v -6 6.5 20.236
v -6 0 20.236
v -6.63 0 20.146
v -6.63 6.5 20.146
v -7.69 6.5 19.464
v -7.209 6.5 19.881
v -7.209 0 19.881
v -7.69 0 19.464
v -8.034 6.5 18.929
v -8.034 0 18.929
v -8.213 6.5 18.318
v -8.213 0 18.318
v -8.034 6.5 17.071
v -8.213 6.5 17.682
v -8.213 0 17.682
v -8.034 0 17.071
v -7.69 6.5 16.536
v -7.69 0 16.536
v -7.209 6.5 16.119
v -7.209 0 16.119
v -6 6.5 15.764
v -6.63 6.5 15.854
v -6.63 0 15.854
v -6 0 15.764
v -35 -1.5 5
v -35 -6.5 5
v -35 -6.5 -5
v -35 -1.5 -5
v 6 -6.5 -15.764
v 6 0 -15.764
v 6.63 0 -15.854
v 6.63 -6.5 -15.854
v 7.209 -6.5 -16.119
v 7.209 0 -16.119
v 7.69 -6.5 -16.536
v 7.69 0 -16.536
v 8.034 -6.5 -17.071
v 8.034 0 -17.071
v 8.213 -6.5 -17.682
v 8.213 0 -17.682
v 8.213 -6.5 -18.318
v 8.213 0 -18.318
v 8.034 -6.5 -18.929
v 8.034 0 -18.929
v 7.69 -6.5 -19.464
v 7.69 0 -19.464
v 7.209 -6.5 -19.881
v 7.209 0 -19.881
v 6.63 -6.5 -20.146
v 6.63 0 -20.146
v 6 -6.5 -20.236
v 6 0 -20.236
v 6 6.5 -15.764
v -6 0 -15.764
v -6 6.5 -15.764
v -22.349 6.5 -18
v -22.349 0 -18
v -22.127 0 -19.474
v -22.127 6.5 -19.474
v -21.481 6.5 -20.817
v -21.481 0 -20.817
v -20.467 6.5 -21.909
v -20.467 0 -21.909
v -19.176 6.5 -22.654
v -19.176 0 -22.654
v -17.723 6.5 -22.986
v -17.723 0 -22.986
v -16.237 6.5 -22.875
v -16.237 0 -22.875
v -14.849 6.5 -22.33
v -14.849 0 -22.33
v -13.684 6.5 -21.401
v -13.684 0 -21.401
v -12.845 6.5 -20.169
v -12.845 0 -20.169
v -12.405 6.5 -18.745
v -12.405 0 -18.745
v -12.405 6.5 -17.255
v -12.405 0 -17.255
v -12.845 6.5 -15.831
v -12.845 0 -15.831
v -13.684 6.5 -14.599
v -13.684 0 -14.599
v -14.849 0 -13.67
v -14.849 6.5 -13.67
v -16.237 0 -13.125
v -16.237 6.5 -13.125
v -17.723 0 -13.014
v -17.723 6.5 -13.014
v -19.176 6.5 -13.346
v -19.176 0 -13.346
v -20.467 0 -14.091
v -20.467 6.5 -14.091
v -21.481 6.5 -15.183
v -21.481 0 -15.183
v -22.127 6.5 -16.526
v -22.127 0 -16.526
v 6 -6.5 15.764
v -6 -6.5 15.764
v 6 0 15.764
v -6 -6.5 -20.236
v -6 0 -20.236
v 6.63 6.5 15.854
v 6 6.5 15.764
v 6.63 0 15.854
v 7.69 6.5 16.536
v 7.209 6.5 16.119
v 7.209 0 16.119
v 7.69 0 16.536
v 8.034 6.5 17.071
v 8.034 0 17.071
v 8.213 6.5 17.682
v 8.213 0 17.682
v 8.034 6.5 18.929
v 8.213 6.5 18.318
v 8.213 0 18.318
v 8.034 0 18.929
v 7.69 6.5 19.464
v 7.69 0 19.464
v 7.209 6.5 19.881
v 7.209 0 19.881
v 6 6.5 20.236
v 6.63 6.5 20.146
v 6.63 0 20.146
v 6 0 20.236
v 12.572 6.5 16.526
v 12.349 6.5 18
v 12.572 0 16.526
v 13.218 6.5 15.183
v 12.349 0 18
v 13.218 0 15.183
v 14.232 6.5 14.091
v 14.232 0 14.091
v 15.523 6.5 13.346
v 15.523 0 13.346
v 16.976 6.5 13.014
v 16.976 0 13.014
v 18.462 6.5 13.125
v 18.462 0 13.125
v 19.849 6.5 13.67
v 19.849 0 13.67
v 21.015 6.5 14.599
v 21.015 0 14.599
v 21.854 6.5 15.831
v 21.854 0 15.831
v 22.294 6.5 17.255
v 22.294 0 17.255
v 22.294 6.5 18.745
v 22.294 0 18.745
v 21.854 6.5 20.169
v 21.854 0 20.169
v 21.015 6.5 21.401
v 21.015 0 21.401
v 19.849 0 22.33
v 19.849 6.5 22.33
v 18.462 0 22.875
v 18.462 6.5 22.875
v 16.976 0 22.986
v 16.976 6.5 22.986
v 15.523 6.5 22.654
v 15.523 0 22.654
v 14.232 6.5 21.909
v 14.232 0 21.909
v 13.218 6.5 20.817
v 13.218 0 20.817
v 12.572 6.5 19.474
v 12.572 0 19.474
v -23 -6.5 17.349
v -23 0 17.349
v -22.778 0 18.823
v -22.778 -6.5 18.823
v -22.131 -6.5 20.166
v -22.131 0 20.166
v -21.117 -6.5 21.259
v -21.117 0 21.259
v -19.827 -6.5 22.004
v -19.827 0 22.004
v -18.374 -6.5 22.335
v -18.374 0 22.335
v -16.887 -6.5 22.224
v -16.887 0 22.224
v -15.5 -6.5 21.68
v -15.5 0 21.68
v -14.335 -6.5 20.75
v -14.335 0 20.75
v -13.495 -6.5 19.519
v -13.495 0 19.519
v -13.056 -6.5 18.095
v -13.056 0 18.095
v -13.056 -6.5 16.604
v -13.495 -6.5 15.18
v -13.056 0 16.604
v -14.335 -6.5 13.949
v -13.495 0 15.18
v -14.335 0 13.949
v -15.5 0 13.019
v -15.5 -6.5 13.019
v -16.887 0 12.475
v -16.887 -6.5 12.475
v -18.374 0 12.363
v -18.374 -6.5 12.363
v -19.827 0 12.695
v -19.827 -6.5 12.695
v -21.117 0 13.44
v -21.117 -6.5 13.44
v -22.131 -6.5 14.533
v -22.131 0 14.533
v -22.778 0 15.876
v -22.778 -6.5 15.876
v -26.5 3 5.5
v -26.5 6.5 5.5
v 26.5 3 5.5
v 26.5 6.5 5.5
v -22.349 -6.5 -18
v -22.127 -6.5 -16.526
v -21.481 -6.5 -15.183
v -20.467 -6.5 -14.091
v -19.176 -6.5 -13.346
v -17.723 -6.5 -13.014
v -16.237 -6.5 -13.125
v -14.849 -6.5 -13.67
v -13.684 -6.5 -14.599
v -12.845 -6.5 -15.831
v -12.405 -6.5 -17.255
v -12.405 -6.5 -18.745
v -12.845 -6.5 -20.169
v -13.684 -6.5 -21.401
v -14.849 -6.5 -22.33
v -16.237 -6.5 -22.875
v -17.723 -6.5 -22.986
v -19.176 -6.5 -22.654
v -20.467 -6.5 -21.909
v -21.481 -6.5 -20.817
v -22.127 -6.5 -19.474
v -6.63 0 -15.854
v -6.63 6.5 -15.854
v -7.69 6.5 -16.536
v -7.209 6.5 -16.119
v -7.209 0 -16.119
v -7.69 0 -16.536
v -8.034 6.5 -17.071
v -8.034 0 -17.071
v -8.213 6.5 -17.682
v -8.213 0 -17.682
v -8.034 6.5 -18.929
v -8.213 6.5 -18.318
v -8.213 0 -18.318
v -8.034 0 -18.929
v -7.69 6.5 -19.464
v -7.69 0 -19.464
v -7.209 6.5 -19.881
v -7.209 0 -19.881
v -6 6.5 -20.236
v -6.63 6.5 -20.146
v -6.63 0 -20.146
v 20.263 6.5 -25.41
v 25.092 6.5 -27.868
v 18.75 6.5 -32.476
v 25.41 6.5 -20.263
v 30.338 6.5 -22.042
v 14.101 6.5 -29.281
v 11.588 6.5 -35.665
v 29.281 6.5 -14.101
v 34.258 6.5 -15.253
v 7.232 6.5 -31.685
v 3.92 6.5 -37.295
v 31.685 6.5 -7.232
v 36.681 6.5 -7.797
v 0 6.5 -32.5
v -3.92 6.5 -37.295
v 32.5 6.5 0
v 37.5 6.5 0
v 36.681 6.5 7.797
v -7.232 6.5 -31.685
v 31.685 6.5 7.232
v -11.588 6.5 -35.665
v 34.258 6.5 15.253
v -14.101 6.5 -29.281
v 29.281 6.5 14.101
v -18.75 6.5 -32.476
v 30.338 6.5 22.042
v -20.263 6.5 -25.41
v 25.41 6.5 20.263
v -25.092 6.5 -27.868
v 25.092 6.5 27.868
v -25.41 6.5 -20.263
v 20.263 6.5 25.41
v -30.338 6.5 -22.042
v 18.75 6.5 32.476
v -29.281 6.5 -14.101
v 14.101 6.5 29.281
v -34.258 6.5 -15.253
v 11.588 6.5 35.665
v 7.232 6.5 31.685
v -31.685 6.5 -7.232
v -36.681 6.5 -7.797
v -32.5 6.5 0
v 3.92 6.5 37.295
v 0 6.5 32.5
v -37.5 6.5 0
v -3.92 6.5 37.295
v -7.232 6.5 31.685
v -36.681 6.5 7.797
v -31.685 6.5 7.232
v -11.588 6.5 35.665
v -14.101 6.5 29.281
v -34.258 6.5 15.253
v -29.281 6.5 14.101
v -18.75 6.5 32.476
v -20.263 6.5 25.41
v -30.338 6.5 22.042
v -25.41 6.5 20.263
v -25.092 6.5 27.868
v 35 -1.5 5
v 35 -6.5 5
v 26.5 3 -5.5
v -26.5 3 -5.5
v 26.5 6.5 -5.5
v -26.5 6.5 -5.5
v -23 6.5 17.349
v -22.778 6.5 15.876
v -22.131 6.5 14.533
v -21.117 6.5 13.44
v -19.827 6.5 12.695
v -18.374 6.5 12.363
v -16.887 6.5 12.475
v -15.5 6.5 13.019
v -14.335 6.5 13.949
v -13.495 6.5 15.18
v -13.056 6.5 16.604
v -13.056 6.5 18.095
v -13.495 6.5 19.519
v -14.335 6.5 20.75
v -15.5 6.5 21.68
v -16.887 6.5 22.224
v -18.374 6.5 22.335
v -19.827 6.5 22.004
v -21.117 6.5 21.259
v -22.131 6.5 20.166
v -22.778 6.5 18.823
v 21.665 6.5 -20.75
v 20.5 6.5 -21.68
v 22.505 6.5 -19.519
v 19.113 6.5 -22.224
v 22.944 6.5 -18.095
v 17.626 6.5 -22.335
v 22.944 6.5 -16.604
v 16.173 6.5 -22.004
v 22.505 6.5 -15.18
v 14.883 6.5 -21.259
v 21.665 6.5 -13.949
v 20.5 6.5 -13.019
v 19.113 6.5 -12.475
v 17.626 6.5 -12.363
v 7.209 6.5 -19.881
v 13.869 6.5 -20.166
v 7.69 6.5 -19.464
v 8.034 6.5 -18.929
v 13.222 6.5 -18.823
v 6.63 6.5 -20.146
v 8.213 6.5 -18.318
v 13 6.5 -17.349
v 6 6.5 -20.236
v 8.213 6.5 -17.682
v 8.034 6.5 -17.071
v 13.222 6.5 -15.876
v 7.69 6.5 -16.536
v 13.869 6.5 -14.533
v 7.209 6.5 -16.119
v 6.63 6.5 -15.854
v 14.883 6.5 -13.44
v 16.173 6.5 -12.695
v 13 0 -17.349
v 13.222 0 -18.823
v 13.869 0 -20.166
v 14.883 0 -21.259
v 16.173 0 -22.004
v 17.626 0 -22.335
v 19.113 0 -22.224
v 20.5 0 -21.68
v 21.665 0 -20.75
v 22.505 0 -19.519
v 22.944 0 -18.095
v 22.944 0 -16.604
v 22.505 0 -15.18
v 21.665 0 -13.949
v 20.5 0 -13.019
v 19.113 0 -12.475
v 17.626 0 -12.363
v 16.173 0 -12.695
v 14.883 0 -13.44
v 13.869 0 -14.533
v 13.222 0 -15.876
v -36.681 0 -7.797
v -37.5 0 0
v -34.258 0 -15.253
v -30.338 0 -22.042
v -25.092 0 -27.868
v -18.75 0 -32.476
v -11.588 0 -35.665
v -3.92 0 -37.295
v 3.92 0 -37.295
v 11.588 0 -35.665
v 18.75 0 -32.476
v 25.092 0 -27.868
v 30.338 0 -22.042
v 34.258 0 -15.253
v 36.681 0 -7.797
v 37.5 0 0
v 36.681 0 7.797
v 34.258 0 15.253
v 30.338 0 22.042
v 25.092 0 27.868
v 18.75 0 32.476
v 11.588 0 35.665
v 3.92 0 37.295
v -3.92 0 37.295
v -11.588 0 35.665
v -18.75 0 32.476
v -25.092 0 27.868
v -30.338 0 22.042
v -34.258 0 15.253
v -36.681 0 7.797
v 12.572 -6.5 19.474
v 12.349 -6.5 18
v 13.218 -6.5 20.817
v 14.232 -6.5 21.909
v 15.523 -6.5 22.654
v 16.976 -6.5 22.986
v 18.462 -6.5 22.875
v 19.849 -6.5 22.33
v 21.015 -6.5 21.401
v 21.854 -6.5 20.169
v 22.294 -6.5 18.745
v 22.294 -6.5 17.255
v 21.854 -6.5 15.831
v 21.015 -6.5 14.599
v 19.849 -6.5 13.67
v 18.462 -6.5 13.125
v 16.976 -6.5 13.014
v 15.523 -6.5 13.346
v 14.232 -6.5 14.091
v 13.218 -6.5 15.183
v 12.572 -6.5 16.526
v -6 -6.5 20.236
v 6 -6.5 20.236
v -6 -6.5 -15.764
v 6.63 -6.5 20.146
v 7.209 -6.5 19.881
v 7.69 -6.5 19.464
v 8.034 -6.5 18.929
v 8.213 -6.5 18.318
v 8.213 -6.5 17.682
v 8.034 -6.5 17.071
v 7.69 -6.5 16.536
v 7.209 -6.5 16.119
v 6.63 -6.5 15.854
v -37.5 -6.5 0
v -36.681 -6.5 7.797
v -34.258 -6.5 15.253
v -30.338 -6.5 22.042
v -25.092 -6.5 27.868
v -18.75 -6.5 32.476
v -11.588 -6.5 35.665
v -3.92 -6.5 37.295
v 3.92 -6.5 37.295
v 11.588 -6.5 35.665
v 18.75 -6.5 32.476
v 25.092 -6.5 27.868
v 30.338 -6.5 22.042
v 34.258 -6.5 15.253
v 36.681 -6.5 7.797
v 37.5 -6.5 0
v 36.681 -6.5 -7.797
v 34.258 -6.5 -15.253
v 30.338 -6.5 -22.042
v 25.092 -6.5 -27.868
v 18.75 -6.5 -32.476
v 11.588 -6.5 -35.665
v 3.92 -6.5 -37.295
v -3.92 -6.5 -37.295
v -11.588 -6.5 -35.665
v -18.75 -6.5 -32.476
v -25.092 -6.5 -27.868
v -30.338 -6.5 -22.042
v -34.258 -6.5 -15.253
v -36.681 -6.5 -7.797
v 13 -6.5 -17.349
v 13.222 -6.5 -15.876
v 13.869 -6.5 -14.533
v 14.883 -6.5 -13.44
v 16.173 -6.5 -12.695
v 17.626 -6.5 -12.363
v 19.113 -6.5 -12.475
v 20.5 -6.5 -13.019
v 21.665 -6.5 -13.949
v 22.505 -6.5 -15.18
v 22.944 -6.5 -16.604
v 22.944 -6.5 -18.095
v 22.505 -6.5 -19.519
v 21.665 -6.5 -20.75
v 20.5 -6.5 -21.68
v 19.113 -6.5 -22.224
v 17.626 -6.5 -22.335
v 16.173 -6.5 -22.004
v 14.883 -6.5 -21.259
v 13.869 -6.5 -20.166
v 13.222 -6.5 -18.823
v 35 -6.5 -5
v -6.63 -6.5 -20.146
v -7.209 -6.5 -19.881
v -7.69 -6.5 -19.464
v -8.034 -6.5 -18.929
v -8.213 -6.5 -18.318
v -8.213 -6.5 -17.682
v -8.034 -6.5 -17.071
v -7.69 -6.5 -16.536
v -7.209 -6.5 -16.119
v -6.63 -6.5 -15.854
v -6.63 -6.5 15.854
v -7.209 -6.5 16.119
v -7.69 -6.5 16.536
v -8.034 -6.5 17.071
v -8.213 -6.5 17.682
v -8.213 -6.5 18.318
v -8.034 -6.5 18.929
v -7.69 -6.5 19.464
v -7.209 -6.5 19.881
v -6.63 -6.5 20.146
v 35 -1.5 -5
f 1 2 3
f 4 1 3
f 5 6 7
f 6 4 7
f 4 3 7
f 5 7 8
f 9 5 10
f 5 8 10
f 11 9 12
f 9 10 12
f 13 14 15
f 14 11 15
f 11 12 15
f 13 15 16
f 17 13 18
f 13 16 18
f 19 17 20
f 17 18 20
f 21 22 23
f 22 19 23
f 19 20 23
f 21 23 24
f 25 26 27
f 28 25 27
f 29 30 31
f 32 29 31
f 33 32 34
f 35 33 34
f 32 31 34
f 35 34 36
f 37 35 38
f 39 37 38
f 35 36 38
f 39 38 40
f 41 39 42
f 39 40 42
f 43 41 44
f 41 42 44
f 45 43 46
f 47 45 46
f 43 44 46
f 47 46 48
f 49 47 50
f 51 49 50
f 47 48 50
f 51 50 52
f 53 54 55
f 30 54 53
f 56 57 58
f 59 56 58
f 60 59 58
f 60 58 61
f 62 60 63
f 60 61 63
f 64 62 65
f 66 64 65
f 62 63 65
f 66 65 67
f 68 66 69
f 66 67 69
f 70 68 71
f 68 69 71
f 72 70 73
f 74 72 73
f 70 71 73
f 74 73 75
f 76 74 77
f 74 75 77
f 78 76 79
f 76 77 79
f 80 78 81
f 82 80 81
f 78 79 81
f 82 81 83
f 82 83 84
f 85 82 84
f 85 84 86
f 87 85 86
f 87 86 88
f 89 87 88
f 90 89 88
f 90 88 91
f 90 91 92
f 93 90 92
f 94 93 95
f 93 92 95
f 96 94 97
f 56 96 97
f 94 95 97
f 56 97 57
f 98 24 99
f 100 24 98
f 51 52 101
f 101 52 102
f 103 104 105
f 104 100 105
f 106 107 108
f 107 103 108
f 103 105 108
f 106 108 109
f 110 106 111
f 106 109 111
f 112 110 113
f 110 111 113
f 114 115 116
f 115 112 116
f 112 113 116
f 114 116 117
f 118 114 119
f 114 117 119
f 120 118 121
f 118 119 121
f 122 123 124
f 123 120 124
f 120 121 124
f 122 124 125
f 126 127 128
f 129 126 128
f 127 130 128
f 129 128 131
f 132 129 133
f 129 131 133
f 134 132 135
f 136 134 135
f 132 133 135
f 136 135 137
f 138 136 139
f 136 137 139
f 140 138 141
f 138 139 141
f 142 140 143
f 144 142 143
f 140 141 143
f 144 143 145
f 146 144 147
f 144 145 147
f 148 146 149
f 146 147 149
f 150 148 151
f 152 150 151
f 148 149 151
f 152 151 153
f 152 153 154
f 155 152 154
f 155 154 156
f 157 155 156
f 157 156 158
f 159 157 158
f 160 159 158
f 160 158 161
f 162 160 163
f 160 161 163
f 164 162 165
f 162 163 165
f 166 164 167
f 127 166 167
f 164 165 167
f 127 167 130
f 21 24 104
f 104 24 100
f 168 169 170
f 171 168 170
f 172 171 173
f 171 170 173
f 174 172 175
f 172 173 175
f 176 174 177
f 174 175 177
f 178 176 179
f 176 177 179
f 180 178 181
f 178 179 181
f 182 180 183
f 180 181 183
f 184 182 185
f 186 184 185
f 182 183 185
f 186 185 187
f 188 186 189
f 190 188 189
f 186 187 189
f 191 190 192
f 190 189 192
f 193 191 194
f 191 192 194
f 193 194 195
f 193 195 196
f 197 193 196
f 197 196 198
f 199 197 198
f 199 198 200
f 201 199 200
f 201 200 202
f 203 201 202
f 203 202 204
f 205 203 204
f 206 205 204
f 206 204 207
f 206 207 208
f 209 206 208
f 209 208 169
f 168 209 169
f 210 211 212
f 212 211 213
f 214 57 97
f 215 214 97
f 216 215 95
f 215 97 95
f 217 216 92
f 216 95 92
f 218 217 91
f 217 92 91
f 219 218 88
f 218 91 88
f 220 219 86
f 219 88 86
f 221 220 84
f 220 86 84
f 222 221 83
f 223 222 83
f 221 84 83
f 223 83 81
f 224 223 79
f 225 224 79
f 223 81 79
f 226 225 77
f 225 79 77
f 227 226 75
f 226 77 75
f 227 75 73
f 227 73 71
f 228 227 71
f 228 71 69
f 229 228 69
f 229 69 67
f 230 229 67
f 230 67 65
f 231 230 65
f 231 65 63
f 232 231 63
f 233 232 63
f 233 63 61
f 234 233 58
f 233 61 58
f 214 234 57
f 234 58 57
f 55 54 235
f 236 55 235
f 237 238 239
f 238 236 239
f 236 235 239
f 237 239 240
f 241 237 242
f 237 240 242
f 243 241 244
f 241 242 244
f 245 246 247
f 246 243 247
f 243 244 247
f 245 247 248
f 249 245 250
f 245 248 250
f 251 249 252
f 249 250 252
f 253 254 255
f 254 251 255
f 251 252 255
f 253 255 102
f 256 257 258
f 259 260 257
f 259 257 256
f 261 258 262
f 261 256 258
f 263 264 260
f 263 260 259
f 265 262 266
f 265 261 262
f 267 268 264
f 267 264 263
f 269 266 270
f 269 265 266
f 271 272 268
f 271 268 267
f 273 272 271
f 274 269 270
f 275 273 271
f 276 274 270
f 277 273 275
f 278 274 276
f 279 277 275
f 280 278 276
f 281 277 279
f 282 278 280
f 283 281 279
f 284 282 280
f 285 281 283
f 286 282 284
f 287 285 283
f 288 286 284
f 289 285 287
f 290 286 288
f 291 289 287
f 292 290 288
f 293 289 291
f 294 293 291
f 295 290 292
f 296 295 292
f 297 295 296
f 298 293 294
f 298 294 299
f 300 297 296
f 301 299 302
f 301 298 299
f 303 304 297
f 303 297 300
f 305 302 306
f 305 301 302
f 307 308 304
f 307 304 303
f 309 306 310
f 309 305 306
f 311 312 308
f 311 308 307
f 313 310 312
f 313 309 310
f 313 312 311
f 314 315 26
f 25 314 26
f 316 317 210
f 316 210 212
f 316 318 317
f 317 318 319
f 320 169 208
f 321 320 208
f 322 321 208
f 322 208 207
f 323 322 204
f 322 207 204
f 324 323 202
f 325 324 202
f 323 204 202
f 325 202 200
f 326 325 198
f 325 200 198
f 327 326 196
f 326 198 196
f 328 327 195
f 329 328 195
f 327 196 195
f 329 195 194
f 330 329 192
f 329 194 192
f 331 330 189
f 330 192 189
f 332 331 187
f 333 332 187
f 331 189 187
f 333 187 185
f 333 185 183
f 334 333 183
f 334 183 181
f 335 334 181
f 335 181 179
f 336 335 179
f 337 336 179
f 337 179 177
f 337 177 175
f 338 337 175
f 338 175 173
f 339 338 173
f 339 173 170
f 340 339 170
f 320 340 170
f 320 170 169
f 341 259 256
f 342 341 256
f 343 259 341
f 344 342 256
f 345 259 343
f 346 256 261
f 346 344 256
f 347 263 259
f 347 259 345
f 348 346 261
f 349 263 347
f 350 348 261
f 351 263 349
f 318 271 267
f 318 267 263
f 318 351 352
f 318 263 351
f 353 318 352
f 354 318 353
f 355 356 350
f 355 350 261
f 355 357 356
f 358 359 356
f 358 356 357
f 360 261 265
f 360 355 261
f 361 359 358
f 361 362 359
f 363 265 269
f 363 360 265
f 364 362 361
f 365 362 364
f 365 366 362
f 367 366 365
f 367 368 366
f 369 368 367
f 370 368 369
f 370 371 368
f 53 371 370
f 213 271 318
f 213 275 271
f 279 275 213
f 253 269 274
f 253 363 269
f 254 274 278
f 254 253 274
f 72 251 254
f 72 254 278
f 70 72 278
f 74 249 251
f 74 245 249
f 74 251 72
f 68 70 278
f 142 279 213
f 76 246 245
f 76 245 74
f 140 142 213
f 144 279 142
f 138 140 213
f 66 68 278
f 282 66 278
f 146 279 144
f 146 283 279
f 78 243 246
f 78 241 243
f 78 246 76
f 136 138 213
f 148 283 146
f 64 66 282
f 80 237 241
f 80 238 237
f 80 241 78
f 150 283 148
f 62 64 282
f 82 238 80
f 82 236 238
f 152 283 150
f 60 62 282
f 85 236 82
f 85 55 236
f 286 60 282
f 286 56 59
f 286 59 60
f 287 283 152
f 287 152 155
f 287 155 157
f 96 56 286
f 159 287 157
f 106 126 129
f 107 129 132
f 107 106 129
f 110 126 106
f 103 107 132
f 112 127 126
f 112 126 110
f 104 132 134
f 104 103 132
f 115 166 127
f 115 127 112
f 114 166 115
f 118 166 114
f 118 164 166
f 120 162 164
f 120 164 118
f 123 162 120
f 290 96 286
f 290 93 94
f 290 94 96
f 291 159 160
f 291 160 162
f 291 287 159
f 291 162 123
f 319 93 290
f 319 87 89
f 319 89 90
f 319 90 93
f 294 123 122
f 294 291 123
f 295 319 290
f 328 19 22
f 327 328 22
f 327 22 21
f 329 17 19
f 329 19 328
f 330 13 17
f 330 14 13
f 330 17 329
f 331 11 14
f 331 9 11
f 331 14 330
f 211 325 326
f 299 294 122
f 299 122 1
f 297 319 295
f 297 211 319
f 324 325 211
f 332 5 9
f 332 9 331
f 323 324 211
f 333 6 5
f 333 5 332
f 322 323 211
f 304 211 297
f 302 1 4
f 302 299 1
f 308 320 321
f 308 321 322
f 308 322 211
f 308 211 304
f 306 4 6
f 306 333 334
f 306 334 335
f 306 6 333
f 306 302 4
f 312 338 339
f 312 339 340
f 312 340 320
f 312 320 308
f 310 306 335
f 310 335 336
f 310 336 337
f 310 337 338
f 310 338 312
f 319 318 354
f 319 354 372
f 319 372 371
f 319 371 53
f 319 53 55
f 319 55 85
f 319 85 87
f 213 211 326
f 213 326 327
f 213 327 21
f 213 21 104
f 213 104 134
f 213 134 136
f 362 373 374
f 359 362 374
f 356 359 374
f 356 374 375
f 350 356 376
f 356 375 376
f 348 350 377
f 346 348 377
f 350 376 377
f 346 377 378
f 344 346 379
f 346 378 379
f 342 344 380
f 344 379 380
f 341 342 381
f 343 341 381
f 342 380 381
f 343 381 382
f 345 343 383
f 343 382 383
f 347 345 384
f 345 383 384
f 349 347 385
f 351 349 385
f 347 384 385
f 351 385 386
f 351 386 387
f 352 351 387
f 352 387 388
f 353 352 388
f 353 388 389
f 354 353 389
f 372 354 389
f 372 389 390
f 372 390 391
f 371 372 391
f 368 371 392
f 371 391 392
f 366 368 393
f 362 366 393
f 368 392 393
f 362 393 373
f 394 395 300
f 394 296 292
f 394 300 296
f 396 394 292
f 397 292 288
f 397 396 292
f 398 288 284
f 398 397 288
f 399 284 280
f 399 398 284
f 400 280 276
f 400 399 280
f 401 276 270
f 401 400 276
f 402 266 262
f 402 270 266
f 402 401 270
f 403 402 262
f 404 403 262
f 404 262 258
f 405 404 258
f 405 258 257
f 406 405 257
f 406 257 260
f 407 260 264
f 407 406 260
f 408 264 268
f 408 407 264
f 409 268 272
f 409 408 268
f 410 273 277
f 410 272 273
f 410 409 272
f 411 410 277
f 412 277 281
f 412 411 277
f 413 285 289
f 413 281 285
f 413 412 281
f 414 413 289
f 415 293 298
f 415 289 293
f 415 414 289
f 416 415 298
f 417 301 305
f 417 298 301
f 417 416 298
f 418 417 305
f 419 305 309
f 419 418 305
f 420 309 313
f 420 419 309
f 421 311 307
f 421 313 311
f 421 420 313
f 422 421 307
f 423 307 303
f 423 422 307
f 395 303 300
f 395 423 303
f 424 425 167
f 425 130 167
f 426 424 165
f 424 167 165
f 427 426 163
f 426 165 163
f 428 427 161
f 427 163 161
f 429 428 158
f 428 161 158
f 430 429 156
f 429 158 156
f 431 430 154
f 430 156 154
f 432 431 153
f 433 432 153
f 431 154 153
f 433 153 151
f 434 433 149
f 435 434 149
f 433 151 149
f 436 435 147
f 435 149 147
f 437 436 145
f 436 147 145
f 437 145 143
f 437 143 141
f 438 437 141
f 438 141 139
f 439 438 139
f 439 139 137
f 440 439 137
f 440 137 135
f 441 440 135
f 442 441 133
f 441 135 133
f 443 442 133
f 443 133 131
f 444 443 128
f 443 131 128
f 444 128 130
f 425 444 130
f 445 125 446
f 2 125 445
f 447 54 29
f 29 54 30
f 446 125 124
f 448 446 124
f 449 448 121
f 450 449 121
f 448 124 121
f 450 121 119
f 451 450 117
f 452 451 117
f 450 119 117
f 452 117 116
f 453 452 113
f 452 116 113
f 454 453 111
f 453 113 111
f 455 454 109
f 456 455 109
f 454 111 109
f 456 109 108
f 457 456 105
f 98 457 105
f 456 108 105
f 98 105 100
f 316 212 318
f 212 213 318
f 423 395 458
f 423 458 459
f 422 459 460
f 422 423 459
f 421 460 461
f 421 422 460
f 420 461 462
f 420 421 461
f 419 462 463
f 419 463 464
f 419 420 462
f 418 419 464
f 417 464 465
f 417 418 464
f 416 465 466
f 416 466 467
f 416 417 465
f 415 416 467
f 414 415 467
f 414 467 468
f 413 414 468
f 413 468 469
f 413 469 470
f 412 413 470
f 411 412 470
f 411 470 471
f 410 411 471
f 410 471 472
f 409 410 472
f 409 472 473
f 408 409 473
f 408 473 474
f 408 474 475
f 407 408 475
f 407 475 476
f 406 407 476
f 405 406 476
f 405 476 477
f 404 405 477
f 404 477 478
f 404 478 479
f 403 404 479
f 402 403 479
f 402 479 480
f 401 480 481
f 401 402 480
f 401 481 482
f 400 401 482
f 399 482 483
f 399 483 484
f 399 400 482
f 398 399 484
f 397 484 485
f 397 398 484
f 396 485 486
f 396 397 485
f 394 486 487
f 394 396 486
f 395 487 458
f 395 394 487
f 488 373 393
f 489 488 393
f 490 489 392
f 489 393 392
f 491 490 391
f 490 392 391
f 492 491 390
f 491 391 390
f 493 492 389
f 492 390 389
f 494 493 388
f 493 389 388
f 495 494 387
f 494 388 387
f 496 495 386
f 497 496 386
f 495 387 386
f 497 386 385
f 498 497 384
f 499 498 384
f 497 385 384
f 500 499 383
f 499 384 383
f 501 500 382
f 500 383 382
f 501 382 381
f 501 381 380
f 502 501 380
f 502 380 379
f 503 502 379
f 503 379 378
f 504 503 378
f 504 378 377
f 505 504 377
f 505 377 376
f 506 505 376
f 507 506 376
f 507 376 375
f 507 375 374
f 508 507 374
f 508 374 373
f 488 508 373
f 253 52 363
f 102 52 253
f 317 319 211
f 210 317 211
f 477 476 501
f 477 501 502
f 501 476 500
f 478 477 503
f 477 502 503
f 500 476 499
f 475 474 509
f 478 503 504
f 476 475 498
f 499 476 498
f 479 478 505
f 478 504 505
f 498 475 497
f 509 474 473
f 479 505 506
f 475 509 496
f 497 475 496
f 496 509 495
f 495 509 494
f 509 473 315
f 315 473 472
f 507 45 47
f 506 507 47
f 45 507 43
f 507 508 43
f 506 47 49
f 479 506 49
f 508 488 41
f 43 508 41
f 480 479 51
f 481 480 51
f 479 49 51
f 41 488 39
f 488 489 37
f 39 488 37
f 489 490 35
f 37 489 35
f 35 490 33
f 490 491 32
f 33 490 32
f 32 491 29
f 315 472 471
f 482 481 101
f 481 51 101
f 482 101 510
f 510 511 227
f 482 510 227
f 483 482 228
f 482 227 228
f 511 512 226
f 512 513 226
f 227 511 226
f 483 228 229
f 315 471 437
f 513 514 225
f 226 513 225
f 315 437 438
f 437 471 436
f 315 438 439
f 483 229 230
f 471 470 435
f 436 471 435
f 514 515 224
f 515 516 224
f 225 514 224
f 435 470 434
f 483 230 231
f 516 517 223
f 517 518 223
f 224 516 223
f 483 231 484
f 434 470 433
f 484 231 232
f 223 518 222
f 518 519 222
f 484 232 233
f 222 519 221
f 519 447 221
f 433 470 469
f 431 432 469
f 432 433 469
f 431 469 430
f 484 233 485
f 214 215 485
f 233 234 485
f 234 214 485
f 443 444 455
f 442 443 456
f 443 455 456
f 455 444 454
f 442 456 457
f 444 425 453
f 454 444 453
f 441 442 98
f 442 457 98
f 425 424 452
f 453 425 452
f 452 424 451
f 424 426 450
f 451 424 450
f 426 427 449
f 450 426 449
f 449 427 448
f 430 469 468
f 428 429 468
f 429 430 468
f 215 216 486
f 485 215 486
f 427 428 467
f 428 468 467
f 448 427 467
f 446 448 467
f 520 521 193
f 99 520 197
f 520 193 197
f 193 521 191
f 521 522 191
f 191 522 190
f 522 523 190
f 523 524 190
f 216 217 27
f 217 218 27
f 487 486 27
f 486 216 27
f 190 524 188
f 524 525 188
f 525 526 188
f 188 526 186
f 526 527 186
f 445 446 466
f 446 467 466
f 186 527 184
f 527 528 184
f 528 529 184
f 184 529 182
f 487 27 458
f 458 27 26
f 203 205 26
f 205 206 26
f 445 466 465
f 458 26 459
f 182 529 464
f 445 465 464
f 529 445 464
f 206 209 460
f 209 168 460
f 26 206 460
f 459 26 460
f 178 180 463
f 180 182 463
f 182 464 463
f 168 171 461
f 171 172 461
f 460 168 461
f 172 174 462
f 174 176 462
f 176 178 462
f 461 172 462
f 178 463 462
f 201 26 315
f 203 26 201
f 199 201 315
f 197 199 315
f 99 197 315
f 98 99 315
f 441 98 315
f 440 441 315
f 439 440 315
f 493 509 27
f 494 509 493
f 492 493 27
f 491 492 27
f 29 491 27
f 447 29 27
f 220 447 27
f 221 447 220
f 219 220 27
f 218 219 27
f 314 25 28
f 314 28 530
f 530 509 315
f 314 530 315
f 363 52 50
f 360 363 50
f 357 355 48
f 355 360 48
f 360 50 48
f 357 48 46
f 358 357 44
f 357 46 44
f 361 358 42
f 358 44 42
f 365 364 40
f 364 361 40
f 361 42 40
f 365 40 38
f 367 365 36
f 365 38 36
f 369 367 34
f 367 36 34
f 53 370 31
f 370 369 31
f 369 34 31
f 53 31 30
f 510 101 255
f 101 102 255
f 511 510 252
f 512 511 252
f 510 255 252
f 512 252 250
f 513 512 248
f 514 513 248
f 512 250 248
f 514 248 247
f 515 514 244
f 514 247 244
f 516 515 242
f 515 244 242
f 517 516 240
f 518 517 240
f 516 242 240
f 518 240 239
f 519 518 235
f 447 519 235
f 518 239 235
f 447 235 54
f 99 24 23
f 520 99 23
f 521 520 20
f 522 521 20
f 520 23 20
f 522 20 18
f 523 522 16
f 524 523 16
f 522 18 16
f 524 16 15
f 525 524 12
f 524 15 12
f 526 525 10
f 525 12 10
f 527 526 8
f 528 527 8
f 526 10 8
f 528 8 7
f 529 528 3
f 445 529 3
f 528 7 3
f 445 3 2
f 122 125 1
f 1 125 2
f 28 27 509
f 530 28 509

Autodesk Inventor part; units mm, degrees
ref_plane "YZ Plane" through (0, 0, 0) normal (1, 0, 0) x (0, 1, 0)
ref_plane "XZ Plane" through (0, 0, 0) normal (0, 1, 0) x (-1, 0, 0)
ref_plane "XY Plane" through (0, 0, 0) normal (0, 0, 1) x (1, 0, 0)
sketch "Sketch1" plane through (0, 0, 0) normal (0, 1, 0) x (-1, 0, 0)
  circle A0 centre (0, 0) radius 32.5
  circle A1 centre (0, 0) radius 25
  circle A2 centre (17.3494, -18) radius 5
  circle A3 centre (18, 17.3494) radius 5
  circle A4 centre (-17.3494, 18) radius 5
  circle A5 centre (-18, -17.3494) radius 5
  line L0 (6, -18) -> (-6, -18) construction
  line L1 (6, -15.7639) -> (-6, -15.7639)
  line L2 (-6, -20.2361) -> (6, -20.2361)
  arc A6 (6, -20.2361) -> (6, -15.7639) centre (6, -18) ccw
  arc A7 (-6, -15.7639) -> (-6, -20.2361) centre (-6, -18) ccw
  line L3 (-25, 0) -> (25, 0) construction
  line L4 (6, 15.7639) -> (-6, 15.7639)
  line L5 (-6, 20.2361) -> (6, 20.2361)
  arc A8 (6, 15.7639) -> (6, 20.2361) centre (6, 18) ccw
  arc A9 (-6, 20.2361) -> (-6, 15.7639) centre (-6, 18) ccw
  circle A10 centre (0, 0) radius 37.5
  point P0 (0, -18)
  dimension "d0" = 65
  dimension "d1" = 50
  dimension "d2" = 10
  dimension "d5" = 360
  dimension "d7" = 35.3494
  dimension "d11" = 17.3494
  dimension "d12" = 11.3493
  dimension "d16" = 18
  dimension "d17" = 2.2361
  dimension "d18" = 18
  dimension "d19" = 75
extrude "Extrusion1" add sketch "Sketch1" against normal blind 6.5 contours A0 | A1 A2 A5 A4 A3
extrude "Extrusion2" add sketch "Sketch1" along normal blind 6.5 and the other way blind 6.5 contours A10
sketch "Sketch2" plane through (0, -6.5, 0) normal (0, -1, 0) x (1, 0, 0)
  line L0 (35, 5) -> (-35, 5)
  line L1 (-35, 5) -> (-35, -5)
  line L2 (-35, -5) -> (35, -5)
  line L3 (35, -5) -> (35, 5)
  line L4 (35, 5) -> (-35, -5) construction
  line L5 (-35, 5) -> (35, -5) construction
  point P0 (0, 0)
  dimension "d24" = 10
  dimension "d25" = 70
extrude "Extrusion3" cut sketch "Sketch2" against normal blind 5
extrude "Extrusion4" add sketch "Sketch1" along normal blind 6.5 contours A0 | A1 A2 A5 A4 A3
sketch "Sketch3" plane through (0, 6.5, 0) normal (0, 1, 0) x (1, 0, 0)
  line L0 (-26.5, -5.5) -> (26.5, -5.5)
  line L1 (26.5, -5.5) -> (26.5, 5.5)
  line L2 (26.5, 5.5) -> (-26.5, 5.5)
  line L3 (-26.5, 5.5) -> (-26.5, -5.5)
  line L4 (-26.5, -5.5) -> (26.5, 5.5) construction
  line L5 (26.5, -5.5) -> (-26.5, 5.5) construction
  point P0 (0, 0)
  dimension "d32" = 11
  dimension "d33" = 53
extrude "Extrusion5" cut sketch "Sketch3" against normal blind 3.5
properties part number "case_top"
